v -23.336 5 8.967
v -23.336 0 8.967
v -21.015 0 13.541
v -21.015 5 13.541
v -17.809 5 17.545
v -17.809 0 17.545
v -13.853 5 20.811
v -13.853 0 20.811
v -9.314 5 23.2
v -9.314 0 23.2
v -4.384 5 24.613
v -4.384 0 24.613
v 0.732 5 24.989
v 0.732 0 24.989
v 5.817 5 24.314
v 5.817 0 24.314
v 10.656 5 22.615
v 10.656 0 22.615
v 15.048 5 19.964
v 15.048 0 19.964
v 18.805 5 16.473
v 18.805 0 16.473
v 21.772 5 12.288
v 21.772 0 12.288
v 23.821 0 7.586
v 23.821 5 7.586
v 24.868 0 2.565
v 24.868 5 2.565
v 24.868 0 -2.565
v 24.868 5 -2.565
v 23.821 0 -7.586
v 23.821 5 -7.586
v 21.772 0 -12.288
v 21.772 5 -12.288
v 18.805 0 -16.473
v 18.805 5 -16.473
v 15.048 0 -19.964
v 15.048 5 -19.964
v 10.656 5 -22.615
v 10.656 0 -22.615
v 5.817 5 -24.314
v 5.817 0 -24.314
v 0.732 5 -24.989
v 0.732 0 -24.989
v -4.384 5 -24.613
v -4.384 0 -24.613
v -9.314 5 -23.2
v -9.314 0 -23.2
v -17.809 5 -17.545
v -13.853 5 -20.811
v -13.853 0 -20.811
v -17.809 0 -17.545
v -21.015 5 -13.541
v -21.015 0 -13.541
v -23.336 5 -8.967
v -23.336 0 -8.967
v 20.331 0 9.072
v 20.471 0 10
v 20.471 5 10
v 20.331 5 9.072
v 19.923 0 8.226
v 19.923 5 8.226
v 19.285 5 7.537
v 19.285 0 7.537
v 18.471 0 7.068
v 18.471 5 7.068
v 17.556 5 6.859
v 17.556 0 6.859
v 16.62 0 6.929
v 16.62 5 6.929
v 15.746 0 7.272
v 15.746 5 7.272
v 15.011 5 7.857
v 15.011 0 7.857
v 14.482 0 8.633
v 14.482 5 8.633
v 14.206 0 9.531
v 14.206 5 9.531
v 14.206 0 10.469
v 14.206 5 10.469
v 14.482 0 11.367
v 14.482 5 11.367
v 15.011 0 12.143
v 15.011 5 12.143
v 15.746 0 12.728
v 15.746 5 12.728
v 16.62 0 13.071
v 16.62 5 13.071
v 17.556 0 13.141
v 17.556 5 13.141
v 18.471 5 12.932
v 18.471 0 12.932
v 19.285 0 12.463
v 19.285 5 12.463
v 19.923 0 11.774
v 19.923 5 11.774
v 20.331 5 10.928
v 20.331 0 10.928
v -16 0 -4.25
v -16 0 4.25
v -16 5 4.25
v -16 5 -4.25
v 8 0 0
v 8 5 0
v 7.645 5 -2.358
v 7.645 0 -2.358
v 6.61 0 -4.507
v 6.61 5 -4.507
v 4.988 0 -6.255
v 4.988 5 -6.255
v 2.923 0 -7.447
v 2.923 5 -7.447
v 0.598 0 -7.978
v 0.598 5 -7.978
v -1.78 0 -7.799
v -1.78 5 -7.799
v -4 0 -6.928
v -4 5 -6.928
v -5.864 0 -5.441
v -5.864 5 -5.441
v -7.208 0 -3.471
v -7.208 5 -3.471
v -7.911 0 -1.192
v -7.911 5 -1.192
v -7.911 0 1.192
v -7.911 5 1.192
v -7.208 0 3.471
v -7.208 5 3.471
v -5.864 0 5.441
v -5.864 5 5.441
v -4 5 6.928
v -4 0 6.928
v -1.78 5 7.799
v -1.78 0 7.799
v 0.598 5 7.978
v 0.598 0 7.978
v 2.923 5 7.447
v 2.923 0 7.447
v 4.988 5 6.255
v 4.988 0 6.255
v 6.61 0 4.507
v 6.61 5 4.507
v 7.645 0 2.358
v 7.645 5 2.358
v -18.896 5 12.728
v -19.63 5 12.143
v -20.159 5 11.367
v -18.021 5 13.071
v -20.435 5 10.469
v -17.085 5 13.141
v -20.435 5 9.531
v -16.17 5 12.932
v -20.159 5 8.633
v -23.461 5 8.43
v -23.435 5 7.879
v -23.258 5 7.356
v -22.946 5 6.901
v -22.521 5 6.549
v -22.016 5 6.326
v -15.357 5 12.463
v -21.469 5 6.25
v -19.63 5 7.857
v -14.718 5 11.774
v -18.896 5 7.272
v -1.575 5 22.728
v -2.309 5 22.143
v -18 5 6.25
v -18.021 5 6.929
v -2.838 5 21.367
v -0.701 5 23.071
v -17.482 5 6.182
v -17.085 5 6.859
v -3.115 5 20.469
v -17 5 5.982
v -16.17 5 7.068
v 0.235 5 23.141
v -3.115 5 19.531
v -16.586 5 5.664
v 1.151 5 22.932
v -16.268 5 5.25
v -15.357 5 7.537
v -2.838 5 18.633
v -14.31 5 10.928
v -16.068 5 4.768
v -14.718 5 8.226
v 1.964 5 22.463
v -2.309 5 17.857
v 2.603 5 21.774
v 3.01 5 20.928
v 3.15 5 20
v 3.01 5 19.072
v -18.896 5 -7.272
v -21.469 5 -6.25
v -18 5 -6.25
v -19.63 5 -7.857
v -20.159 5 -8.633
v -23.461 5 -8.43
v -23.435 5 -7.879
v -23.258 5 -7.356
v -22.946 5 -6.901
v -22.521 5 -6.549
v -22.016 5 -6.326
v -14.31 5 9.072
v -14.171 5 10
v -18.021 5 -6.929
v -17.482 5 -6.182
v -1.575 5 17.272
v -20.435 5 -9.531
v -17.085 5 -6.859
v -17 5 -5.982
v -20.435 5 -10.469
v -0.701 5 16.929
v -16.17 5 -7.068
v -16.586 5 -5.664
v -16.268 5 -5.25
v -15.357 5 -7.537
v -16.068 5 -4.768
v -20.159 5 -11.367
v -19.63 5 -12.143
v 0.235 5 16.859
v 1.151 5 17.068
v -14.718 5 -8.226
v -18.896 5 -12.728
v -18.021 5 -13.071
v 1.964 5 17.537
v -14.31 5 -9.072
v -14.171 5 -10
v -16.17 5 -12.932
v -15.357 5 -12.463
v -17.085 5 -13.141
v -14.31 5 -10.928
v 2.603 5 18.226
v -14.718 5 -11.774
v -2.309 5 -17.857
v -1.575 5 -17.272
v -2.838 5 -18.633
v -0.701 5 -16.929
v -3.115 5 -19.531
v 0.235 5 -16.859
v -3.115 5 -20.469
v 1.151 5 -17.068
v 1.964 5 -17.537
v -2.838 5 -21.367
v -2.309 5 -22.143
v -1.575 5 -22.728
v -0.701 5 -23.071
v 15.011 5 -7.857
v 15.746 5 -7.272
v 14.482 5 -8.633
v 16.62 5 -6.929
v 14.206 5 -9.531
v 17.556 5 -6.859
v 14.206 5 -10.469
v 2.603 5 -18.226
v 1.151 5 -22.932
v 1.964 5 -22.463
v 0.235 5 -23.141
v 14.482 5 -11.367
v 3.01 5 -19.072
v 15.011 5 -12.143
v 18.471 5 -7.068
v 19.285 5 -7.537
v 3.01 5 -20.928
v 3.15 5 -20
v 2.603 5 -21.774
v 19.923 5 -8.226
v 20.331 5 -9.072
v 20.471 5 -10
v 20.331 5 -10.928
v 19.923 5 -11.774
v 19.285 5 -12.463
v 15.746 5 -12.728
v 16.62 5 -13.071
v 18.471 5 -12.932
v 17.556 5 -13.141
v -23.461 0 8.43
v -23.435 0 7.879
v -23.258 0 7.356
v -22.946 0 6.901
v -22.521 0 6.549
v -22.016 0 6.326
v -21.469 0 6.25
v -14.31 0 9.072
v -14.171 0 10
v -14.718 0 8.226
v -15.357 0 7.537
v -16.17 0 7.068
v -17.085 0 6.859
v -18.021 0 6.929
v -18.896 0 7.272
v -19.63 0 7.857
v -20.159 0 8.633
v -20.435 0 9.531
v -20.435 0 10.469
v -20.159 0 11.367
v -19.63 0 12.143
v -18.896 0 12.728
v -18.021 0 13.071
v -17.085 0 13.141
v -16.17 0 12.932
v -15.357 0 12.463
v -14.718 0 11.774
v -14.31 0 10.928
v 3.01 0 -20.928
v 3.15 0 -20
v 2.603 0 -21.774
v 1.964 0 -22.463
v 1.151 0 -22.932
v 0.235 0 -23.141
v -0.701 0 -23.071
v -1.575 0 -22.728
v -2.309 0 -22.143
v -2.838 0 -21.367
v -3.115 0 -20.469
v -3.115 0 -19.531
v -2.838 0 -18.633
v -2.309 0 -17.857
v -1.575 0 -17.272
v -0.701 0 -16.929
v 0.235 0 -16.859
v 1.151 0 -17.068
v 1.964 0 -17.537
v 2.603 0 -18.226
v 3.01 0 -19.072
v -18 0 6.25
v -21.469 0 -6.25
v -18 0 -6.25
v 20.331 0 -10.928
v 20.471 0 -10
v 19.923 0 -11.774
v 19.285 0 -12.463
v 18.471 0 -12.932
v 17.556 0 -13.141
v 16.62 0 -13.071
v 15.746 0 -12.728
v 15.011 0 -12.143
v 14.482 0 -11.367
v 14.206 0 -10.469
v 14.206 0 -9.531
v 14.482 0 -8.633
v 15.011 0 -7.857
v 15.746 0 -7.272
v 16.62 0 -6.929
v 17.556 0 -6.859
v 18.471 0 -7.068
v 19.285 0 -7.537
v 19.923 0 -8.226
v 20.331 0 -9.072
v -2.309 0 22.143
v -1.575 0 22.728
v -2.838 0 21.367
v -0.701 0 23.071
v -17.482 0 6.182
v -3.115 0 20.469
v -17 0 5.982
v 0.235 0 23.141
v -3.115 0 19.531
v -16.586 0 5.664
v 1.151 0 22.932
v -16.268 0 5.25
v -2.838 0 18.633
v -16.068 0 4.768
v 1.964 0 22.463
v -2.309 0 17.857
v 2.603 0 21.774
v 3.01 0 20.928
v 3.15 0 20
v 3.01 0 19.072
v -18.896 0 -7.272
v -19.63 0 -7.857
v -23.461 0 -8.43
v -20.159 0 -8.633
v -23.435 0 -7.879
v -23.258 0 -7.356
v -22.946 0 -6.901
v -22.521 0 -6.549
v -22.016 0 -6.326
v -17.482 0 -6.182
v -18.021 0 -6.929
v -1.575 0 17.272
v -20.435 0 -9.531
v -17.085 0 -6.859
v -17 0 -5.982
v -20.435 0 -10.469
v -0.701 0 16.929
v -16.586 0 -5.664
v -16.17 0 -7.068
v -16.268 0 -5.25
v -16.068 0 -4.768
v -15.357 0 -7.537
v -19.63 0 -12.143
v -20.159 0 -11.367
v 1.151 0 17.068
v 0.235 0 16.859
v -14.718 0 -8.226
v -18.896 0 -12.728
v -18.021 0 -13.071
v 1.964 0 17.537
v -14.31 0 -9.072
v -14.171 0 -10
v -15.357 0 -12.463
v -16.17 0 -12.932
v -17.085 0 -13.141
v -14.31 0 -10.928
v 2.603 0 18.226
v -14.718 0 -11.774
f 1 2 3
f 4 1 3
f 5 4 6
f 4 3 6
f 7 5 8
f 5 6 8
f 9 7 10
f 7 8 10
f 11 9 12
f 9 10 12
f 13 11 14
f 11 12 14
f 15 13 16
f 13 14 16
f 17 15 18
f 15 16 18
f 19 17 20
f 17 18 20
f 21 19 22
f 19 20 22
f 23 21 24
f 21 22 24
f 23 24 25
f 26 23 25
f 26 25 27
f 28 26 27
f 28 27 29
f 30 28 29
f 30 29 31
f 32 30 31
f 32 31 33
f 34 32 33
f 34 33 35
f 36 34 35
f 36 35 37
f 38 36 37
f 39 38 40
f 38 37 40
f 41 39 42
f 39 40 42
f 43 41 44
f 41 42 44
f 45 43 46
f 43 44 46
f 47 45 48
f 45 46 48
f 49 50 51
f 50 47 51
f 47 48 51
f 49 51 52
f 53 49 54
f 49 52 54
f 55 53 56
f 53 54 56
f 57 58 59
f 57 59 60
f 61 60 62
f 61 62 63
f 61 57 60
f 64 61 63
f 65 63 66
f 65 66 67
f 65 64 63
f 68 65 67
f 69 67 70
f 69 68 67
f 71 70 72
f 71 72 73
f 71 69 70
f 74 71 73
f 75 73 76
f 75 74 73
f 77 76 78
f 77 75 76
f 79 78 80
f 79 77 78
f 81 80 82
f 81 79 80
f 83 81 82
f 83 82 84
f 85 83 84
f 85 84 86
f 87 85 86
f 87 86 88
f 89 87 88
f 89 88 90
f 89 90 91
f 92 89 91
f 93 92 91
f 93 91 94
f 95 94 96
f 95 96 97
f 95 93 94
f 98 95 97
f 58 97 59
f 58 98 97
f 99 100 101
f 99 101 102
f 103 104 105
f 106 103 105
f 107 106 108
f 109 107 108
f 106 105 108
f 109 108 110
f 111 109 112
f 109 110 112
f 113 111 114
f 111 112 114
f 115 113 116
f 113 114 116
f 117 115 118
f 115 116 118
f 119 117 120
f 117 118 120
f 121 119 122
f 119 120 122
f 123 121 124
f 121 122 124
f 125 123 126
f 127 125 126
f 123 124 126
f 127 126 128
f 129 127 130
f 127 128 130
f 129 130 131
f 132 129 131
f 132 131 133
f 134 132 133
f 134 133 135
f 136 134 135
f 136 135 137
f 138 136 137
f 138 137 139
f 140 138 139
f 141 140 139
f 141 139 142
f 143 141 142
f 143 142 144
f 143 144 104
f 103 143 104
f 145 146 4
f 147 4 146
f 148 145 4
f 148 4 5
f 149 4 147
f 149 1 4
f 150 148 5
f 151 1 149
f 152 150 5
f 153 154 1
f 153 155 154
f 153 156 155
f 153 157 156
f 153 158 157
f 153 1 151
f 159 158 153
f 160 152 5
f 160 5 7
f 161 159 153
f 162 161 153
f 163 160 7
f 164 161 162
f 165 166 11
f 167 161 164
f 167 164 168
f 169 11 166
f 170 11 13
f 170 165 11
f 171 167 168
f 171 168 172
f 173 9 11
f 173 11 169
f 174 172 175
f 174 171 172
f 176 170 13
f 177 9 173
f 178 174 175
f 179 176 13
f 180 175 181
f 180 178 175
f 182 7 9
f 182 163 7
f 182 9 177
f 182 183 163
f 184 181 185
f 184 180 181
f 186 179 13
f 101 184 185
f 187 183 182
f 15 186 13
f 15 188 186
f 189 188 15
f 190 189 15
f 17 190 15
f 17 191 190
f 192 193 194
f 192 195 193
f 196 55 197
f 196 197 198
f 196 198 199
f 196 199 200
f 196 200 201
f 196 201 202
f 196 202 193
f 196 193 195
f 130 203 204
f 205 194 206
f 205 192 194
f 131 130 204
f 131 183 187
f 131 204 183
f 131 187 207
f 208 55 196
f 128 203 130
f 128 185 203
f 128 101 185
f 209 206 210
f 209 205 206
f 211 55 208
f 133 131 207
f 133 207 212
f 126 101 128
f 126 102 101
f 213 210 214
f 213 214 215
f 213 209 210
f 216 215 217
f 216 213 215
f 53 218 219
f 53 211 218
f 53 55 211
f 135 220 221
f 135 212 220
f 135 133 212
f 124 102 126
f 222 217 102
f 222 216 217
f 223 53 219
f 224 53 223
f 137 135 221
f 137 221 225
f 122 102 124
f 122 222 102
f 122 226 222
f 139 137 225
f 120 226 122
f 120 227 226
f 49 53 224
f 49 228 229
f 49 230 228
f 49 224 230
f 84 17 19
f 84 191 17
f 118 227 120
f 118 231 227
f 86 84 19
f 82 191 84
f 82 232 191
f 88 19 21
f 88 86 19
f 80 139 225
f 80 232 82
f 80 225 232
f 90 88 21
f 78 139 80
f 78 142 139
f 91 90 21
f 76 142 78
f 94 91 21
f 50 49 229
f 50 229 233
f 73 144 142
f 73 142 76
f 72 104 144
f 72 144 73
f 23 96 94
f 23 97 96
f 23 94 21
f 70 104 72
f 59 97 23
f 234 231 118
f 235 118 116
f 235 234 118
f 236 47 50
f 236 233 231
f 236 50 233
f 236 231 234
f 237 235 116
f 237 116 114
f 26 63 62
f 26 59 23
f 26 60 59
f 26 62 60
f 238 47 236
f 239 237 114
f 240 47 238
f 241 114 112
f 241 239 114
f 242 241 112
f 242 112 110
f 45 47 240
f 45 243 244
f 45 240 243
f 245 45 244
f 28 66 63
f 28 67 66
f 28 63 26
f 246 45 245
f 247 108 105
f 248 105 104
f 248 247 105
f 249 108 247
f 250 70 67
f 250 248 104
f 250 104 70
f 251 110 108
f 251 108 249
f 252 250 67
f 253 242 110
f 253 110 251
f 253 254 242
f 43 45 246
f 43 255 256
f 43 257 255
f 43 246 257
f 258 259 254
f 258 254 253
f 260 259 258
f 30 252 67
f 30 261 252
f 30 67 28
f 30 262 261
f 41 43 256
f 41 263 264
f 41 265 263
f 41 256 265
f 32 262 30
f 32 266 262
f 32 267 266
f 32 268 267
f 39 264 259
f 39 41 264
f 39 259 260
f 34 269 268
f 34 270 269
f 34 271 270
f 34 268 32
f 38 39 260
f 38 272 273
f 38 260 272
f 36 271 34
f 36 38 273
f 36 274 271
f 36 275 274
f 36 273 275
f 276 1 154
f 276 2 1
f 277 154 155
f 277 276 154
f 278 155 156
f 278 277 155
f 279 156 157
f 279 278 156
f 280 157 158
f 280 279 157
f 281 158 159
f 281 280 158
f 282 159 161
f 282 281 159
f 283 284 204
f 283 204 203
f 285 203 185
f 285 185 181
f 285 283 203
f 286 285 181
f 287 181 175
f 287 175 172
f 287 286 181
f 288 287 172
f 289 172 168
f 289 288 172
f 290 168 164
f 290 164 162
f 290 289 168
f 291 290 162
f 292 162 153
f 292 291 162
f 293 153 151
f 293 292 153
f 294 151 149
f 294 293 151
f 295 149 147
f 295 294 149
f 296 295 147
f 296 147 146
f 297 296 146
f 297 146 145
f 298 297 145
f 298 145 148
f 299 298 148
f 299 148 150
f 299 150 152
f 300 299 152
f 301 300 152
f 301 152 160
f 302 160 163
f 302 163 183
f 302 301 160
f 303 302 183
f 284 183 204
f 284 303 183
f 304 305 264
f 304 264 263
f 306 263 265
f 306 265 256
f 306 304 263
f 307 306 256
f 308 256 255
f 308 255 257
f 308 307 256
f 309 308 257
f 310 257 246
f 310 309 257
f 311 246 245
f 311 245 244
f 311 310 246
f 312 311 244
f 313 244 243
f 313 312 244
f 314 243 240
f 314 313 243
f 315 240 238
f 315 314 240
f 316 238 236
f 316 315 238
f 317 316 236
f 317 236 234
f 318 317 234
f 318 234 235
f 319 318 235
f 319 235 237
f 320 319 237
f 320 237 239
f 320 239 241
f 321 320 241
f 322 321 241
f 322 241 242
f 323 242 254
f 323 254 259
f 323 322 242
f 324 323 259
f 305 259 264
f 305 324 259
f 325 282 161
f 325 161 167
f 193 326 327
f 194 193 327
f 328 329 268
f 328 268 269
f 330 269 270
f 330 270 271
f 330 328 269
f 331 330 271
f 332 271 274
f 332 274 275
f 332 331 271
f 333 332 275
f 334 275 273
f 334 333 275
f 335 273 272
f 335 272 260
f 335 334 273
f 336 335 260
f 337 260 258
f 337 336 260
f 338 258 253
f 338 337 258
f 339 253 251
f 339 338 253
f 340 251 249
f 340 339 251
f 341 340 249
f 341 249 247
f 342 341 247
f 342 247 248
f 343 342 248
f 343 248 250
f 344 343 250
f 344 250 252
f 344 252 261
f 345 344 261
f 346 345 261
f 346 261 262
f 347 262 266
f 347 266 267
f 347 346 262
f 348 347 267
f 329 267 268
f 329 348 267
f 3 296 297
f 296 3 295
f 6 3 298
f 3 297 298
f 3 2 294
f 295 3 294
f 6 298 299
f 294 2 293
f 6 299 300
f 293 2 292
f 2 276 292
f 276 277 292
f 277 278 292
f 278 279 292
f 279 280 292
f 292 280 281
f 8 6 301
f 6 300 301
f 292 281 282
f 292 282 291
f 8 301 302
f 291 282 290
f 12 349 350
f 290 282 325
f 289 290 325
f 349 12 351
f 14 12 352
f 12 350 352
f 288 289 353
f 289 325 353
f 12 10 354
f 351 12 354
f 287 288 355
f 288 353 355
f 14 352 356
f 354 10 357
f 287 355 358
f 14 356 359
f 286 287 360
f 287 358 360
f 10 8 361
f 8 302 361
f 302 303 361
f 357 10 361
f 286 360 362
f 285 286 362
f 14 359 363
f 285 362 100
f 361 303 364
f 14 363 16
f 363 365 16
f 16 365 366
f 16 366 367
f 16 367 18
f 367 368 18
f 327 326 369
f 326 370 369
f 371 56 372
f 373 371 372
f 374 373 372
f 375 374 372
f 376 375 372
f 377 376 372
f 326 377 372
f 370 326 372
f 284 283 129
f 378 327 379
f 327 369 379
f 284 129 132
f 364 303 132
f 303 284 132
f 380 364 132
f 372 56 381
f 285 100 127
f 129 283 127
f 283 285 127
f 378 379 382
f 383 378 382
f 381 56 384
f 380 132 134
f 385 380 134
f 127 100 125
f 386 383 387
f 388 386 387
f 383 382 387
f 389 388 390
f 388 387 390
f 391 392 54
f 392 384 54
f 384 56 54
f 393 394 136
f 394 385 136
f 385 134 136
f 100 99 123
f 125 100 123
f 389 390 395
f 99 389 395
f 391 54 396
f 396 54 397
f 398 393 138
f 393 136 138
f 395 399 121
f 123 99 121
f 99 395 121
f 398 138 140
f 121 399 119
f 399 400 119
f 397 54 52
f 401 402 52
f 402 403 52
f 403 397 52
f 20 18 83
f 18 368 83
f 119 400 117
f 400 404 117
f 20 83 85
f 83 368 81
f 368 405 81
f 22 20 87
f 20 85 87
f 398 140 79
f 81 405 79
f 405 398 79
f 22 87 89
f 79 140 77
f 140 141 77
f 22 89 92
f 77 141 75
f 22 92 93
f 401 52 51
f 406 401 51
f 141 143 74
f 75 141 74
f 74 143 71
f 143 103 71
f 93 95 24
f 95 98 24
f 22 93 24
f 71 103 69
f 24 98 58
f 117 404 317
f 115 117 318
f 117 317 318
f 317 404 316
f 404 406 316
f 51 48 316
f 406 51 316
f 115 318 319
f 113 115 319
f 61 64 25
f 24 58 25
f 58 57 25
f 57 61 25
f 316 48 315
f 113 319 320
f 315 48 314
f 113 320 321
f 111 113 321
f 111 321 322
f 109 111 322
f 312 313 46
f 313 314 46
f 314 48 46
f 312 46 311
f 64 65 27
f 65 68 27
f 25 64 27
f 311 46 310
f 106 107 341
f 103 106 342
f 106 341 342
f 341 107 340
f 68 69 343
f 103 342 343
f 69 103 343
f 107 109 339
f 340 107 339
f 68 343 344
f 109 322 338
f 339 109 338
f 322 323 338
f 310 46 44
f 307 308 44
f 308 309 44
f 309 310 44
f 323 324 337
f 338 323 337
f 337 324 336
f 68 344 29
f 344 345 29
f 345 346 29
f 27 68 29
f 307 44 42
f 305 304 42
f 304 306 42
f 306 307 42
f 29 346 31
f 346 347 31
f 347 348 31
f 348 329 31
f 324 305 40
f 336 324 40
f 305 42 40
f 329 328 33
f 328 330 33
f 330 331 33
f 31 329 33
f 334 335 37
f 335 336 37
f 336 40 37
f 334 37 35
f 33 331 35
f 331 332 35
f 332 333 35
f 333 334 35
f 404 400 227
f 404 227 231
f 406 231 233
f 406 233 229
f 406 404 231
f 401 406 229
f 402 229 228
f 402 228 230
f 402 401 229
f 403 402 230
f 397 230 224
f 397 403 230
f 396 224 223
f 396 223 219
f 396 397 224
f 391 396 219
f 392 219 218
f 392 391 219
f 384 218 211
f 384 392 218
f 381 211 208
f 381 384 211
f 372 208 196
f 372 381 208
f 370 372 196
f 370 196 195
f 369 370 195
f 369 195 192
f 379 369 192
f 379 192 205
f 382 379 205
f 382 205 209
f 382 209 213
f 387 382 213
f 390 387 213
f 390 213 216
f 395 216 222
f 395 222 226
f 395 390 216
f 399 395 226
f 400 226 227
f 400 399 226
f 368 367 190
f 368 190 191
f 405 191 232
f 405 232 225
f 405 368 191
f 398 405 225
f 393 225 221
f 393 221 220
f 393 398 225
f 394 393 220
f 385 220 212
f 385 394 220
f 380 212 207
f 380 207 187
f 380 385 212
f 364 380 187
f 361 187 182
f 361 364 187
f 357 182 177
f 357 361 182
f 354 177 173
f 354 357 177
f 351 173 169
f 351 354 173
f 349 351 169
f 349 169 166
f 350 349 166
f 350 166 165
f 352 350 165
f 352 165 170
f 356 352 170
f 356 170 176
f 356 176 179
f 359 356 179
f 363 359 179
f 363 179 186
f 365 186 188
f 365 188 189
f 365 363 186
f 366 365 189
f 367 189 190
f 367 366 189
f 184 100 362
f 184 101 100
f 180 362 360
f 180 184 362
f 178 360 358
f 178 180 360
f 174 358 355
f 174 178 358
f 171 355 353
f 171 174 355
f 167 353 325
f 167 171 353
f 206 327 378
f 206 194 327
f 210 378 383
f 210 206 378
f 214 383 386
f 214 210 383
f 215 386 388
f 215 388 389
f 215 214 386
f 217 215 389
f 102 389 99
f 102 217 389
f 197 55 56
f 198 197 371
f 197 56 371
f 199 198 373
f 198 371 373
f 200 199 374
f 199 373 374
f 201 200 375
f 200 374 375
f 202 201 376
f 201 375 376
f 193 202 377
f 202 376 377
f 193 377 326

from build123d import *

# Parameters (mm, degrees)
SKETCH_1_R          = 25
SKETCH_1_R_2        = 3.15
EXTRUDE_1_DEPTH     = 5
SKETCH_2_W          = 9
SKETCH_2_H          = 12.5
CUT_EXTRUDE_3_DEPTH = 6
FILLET_1_R          = 2
SKETCH_3_R          = 8
CUT_EXTRUDE_4_DEPTH = 6


with BuildPart() as part:
    # 草图1 → 凸台-拉伸1 (new body)
    with BuildSketch(Plane(origin=(0, 0, 0), x_dir=(1, 0, 0), z_dir=(0, 1, 0))):
        Circle(SKETCH_1_R)
        with Locations((0, 20)):
            Circle(SKETCH_1_R_2, mode=Mode.SUBTRACT)
        with Locations((17.320508076, 10)):
            Circle(SKETCH_1_R_2, mode=Mode.SUBTRACT)
        with Locations((17.320508076, -10)):
            Circle(SKETCH_1_R_2, mode=Mode.SUBTRACT)
        with Locations((0, -20)):
            Circle(SKETCH_1_R_2, mode=Mode.SUBTRACT)
        with Locations((-17.320508076, -10)):
            Circle(SKETCH_1_R_2, mode=Mode.SUBTRACT)
        with Locations((-17.320508076, 10)):
            Circle(SKETCH_1_R_2, mode=Mode.SUBTRACT)
    extrude(amount=EXTRUDE_1_DEPTH)

    # 草图2 → 切除-拉伸3 (cut, through all)
    with BuildSketch(Plane(origin=(0, 0, 0), x_dir=(1, 0, 0), z_dir=(0, 1, 0))):
        with Locations((-20.5, 0)):
            Rectangle(SKETCH_2_W, SKETCH_2_H)
    extrude(amount=CUT_EXTRUDE_3_DEPTH, mode=Mode.SUBTRACT)

    # 圆角1
    fillet_1_edges = [part.edges().sort_by_distance(p)[0] for p in [
        (-24.206145914, 2.5, -6.25),
        (-24.206145914, 2.5, 6.25),
        (-16, 2.5, -6.25),
        (-16, 2.5, 6.25),
    ]]
    fillet(fillet_1_edges, radius=FILLET_1_R)

    # 草图3 → 切除-拉伸4 (cut, through all)
    with BuildSketch(Plane(origin=(0, 5, 0), x_dir=(1, 0, 0), z_dir=(0, 1, 0))):
        Circle(SKETCH_3_R)
    extrude(amount=-CUT_EXTRUDE_4_DEPTH, mode=Mode.SUBTRACT)


solid = part.part
